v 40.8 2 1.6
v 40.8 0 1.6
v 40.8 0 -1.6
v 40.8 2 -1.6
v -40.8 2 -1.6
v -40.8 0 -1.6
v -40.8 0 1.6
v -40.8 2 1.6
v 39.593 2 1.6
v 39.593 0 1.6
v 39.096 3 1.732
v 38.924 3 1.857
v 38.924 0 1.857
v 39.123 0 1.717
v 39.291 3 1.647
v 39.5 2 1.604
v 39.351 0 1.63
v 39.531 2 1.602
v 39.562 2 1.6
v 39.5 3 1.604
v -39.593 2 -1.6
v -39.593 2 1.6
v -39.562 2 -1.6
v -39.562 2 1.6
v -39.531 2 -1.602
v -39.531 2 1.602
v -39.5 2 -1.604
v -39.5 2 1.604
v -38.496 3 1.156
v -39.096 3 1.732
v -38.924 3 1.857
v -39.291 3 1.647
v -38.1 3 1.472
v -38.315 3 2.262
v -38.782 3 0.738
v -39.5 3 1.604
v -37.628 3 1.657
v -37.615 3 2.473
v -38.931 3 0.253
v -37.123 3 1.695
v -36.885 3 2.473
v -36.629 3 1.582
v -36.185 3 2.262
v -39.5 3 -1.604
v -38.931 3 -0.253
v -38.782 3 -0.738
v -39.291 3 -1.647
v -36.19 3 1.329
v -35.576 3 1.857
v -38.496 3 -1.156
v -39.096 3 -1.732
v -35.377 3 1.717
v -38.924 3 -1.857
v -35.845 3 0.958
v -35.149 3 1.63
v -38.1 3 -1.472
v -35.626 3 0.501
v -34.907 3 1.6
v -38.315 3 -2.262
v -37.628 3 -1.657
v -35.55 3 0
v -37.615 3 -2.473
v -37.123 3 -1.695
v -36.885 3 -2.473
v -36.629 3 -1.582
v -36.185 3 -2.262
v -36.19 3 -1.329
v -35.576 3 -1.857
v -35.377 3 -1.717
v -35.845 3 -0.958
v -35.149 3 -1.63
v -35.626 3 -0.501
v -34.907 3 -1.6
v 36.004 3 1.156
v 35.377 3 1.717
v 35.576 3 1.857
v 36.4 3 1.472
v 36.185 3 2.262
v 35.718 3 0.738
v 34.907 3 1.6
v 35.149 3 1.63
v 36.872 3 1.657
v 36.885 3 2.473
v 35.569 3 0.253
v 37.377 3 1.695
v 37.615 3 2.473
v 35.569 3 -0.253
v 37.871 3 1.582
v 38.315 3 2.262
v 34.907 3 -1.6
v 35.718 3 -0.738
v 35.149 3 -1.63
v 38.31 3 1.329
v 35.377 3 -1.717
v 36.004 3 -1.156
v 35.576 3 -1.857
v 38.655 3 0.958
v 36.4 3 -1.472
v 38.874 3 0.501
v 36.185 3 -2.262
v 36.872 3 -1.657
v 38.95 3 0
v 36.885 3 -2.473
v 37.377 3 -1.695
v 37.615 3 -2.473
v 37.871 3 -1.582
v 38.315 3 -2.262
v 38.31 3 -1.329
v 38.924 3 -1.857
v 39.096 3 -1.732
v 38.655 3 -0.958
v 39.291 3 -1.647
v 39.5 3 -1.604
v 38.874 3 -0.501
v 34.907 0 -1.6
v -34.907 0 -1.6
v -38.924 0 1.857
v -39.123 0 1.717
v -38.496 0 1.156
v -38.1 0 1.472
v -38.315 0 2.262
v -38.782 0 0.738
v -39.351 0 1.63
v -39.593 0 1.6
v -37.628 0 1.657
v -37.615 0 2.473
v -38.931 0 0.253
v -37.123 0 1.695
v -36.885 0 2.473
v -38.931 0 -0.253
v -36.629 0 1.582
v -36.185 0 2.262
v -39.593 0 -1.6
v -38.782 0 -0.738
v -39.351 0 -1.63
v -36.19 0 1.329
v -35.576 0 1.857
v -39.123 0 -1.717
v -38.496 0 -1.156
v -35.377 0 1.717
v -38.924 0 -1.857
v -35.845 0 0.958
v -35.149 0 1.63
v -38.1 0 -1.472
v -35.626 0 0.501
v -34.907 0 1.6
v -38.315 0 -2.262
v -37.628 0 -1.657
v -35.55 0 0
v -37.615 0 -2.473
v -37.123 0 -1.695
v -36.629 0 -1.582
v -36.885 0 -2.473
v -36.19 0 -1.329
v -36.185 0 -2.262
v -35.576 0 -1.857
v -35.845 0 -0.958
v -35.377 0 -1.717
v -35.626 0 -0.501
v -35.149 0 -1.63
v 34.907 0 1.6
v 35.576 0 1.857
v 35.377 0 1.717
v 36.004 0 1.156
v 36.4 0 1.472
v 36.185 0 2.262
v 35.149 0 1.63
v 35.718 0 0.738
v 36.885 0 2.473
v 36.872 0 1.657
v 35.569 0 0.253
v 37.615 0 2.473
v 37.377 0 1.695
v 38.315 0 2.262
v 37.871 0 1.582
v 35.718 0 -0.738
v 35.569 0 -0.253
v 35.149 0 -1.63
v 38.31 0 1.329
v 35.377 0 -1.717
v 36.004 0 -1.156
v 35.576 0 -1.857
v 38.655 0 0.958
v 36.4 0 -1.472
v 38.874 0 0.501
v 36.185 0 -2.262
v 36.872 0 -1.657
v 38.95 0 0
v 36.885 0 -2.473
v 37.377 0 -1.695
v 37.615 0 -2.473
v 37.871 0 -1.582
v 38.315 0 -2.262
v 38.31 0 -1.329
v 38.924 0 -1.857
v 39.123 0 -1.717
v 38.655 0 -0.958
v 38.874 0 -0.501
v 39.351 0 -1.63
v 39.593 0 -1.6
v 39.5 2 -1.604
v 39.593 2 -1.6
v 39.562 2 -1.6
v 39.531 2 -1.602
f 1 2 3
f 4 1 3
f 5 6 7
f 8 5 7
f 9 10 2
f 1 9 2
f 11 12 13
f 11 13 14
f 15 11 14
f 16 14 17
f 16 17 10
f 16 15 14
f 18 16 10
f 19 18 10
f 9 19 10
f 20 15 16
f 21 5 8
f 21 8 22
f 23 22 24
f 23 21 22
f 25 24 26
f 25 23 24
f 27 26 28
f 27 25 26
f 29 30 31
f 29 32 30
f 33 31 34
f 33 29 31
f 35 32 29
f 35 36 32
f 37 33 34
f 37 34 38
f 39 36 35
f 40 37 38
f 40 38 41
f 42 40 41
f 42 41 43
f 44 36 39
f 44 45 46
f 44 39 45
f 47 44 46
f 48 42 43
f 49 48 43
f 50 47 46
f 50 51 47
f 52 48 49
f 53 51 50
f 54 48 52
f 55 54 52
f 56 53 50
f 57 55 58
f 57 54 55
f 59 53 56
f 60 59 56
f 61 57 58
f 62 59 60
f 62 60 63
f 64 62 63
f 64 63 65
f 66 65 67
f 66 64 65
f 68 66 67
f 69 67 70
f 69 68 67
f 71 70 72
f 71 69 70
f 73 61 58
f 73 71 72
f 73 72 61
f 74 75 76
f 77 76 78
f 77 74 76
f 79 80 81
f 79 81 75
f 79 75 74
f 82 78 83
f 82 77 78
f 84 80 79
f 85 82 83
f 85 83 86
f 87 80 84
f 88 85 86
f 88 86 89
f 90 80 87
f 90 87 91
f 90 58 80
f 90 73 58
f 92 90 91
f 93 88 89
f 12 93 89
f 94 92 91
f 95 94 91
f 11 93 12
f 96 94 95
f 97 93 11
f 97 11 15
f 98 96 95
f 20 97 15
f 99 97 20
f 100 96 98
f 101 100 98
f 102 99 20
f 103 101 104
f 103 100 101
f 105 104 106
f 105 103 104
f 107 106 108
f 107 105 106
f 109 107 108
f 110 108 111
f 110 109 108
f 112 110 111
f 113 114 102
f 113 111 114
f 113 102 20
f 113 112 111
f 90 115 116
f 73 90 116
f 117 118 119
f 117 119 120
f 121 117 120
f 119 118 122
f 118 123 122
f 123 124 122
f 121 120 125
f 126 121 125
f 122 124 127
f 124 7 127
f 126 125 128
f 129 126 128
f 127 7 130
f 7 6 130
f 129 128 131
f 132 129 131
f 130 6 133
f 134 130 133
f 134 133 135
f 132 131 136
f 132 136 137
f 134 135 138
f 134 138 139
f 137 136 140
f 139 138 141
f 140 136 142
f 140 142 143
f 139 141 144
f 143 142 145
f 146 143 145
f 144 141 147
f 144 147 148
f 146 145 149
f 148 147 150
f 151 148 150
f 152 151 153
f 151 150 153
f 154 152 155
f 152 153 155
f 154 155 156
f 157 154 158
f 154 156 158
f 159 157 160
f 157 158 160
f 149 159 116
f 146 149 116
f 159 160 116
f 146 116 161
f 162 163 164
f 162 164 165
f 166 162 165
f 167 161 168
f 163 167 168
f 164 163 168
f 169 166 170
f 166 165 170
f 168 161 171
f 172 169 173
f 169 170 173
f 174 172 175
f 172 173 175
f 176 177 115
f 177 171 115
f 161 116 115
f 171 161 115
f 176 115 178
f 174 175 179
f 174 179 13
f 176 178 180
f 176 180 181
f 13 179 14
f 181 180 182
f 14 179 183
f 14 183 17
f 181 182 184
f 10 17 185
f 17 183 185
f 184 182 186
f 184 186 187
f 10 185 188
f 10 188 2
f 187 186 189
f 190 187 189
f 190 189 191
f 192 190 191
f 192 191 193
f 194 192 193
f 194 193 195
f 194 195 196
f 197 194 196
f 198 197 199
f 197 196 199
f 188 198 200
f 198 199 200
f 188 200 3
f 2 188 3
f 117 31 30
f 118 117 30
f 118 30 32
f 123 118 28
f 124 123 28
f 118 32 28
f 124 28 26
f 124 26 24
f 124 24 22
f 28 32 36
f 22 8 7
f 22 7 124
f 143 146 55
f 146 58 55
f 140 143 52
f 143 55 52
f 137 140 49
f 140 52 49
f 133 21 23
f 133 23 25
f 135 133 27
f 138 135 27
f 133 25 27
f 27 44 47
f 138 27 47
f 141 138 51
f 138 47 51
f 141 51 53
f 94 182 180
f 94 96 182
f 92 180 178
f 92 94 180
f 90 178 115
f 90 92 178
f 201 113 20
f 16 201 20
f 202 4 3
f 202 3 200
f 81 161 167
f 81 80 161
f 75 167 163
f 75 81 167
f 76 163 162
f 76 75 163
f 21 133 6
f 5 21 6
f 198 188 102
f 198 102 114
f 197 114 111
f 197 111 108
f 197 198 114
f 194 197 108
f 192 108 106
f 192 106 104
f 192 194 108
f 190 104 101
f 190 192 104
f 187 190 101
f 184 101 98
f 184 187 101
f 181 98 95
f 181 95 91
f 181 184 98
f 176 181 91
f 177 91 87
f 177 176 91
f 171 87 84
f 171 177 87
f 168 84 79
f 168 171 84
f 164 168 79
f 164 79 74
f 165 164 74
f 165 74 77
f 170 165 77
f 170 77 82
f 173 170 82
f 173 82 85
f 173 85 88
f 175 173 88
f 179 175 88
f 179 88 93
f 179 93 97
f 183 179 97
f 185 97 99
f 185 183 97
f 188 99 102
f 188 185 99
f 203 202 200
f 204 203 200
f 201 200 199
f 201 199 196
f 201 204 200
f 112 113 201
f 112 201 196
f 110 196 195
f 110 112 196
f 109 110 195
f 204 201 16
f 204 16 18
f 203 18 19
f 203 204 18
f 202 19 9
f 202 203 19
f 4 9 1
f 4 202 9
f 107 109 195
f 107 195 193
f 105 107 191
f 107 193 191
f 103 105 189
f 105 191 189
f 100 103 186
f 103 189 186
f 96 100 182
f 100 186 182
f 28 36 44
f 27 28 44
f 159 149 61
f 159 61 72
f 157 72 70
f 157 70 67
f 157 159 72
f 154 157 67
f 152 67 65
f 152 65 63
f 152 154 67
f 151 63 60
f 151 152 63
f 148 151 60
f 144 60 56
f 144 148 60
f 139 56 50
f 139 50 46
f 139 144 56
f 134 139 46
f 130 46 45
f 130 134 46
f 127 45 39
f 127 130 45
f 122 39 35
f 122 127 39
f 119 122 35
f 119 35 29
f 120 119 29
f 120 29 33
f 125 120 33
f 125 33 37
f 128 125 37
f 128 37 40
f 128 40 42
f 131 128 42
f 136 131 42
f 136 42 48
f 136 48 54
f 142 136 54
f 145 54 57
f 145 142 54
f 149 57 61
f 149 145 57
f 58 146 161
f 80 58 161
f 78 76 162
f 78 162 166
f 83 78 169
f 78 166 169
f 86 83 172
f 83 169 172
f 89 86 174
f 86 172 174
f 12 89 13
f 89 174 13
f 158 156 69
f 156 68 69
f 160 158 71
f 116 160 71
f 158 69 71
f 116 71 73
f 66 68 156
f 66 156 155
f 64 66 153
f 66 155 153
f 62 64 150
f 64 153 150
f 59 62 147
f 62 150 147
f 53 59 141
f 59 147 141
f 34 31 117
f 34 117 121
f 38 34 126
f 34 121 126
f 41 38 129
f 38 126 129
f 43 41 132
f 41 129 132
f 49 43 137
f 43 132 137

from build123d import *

# Parameters (mm, degrees)
SKETCH1_R       = 1.7
SHAPE_DEPTH     = 3
MILL_FILLETS_R  = 1
EDGE_CUTS_DEPTH = 1


with BuildPart() as part:
    # Sketch1 → Shape (new body)
    with BuildSketch(Plane(origin=(0, 0, 0), x_dir=(1, 0, 0), z_dir=(0, 1, 0))):
        with BuildLine():
            Line((-35.329062729, -1.6), (35.329062729, -1.6))
            ThreePointArc((35.329062729, -1.6), (37.25, -2.5), (39.170937271, -1.6))
            Line((39.170937271, -1.6), (40.8, -1.6))
            Line((40.8, -1.6), (40.8, 1.6))
            Line((40.8, 1.6), (39.170937271, 1.6))
            ThreePointArc((39.170937271, 1.6), (37.25, 2.5), (35.329062729, 1.6))
            Line((35.329062729, 1.6), (-35.329062729, 1.6))
            ThreePointArc((-35.329062729, 1.6), (-37.25, 2.5), (-39.170937271, 1.6))
            Line((-39.170937271, 1.6), (-40.8, 1.6))
            Line((-40.8, 1.6), (-40.8, -1.6))
            Line((-40.8, -1.6), (-39.170937271, -1.6))
            ThreePointArc((-39.170937271, -1.6), (-37.25, -2.5), (-35.329062729, -1.6))
        make_face()
        with Locations((37.25, 0)):
            Circle(SKETCH1_R, mode=Mode.SUBTRACT)
        with Locations((-37.25, 0)):
            Circle(SKETCH1_R, mode=Mode.SUBTRACT)
    extrude(amount=SHAPE_DEPTH)

    # Mill fillets
    mill_fillets_edges = [part.edges().sort_by_distance(p)[0] for p in [
        (-35.329062729, 1.5, -1.6),
        (35.329062729, 1.5, -1.6),
        (39.170937271, 1.5, -1.6),
        (39.170937271, 1.5, 1.6),
        (35.329062729, 1.5, 1.6),
        (-35.329062729, 1.5, 1.6),
        (-39.170937271, 1.5, 1.6),
        (-39.170937271, 1.5, -1.6),
    ]]
    fillet(mill_fillets_edges, radius=MILL_FILLETS_R)

    # Sketch2 → Edge cuts (cut)
    with BuildSketch(Plane(origin=(0, 3, 0), x_dir=(1, 0, 0), z_dir=(0, 1, 0))):
        with BuildLine():
            Line((-39.5, -1.60434089), (-39.5, 1.60434089))
            ThreePointArc((-39.5, 1.60434089), (-39.546486866, 1.601085812), (-39.593074903, 1.6))
            Line((-39.593074903, 1.6), (-40.8, 1.6))
            Line((-40.8, 1.6), (-40.8, -1.6))
            Line((-40.8, -1.6), (-39.593074903, -1.6))
            ThreePointArc((-39.593074903, -1.6), (-39.546486866, -1.601085812), (-39.5, -1.60434089))
        make_face()
        with BuildLine():
            ThreePointArc((39.593074903, 1.6), (39.546486866, 1.601085812), (39.5, 1.60434089))
            Line((39.5, 1.60434089), (39.5, -1.60434089))
            ThreePointArc((39.5, -1.60434089), (39.546486866, -1.601085812), (39.593074903, -1.6))
            Line((39.593074903, -1.6), (40.8, -1.6))
            Line((40.8, -1.6), (40.8, 1.6))
            Line((40.8, 1.6), (39.593074903, 1.6))
        make_face()
    extrude(amount=-EDGE_CUTS_DEPTH, mode=Mode.SUBTRACT)


solid = part.part
